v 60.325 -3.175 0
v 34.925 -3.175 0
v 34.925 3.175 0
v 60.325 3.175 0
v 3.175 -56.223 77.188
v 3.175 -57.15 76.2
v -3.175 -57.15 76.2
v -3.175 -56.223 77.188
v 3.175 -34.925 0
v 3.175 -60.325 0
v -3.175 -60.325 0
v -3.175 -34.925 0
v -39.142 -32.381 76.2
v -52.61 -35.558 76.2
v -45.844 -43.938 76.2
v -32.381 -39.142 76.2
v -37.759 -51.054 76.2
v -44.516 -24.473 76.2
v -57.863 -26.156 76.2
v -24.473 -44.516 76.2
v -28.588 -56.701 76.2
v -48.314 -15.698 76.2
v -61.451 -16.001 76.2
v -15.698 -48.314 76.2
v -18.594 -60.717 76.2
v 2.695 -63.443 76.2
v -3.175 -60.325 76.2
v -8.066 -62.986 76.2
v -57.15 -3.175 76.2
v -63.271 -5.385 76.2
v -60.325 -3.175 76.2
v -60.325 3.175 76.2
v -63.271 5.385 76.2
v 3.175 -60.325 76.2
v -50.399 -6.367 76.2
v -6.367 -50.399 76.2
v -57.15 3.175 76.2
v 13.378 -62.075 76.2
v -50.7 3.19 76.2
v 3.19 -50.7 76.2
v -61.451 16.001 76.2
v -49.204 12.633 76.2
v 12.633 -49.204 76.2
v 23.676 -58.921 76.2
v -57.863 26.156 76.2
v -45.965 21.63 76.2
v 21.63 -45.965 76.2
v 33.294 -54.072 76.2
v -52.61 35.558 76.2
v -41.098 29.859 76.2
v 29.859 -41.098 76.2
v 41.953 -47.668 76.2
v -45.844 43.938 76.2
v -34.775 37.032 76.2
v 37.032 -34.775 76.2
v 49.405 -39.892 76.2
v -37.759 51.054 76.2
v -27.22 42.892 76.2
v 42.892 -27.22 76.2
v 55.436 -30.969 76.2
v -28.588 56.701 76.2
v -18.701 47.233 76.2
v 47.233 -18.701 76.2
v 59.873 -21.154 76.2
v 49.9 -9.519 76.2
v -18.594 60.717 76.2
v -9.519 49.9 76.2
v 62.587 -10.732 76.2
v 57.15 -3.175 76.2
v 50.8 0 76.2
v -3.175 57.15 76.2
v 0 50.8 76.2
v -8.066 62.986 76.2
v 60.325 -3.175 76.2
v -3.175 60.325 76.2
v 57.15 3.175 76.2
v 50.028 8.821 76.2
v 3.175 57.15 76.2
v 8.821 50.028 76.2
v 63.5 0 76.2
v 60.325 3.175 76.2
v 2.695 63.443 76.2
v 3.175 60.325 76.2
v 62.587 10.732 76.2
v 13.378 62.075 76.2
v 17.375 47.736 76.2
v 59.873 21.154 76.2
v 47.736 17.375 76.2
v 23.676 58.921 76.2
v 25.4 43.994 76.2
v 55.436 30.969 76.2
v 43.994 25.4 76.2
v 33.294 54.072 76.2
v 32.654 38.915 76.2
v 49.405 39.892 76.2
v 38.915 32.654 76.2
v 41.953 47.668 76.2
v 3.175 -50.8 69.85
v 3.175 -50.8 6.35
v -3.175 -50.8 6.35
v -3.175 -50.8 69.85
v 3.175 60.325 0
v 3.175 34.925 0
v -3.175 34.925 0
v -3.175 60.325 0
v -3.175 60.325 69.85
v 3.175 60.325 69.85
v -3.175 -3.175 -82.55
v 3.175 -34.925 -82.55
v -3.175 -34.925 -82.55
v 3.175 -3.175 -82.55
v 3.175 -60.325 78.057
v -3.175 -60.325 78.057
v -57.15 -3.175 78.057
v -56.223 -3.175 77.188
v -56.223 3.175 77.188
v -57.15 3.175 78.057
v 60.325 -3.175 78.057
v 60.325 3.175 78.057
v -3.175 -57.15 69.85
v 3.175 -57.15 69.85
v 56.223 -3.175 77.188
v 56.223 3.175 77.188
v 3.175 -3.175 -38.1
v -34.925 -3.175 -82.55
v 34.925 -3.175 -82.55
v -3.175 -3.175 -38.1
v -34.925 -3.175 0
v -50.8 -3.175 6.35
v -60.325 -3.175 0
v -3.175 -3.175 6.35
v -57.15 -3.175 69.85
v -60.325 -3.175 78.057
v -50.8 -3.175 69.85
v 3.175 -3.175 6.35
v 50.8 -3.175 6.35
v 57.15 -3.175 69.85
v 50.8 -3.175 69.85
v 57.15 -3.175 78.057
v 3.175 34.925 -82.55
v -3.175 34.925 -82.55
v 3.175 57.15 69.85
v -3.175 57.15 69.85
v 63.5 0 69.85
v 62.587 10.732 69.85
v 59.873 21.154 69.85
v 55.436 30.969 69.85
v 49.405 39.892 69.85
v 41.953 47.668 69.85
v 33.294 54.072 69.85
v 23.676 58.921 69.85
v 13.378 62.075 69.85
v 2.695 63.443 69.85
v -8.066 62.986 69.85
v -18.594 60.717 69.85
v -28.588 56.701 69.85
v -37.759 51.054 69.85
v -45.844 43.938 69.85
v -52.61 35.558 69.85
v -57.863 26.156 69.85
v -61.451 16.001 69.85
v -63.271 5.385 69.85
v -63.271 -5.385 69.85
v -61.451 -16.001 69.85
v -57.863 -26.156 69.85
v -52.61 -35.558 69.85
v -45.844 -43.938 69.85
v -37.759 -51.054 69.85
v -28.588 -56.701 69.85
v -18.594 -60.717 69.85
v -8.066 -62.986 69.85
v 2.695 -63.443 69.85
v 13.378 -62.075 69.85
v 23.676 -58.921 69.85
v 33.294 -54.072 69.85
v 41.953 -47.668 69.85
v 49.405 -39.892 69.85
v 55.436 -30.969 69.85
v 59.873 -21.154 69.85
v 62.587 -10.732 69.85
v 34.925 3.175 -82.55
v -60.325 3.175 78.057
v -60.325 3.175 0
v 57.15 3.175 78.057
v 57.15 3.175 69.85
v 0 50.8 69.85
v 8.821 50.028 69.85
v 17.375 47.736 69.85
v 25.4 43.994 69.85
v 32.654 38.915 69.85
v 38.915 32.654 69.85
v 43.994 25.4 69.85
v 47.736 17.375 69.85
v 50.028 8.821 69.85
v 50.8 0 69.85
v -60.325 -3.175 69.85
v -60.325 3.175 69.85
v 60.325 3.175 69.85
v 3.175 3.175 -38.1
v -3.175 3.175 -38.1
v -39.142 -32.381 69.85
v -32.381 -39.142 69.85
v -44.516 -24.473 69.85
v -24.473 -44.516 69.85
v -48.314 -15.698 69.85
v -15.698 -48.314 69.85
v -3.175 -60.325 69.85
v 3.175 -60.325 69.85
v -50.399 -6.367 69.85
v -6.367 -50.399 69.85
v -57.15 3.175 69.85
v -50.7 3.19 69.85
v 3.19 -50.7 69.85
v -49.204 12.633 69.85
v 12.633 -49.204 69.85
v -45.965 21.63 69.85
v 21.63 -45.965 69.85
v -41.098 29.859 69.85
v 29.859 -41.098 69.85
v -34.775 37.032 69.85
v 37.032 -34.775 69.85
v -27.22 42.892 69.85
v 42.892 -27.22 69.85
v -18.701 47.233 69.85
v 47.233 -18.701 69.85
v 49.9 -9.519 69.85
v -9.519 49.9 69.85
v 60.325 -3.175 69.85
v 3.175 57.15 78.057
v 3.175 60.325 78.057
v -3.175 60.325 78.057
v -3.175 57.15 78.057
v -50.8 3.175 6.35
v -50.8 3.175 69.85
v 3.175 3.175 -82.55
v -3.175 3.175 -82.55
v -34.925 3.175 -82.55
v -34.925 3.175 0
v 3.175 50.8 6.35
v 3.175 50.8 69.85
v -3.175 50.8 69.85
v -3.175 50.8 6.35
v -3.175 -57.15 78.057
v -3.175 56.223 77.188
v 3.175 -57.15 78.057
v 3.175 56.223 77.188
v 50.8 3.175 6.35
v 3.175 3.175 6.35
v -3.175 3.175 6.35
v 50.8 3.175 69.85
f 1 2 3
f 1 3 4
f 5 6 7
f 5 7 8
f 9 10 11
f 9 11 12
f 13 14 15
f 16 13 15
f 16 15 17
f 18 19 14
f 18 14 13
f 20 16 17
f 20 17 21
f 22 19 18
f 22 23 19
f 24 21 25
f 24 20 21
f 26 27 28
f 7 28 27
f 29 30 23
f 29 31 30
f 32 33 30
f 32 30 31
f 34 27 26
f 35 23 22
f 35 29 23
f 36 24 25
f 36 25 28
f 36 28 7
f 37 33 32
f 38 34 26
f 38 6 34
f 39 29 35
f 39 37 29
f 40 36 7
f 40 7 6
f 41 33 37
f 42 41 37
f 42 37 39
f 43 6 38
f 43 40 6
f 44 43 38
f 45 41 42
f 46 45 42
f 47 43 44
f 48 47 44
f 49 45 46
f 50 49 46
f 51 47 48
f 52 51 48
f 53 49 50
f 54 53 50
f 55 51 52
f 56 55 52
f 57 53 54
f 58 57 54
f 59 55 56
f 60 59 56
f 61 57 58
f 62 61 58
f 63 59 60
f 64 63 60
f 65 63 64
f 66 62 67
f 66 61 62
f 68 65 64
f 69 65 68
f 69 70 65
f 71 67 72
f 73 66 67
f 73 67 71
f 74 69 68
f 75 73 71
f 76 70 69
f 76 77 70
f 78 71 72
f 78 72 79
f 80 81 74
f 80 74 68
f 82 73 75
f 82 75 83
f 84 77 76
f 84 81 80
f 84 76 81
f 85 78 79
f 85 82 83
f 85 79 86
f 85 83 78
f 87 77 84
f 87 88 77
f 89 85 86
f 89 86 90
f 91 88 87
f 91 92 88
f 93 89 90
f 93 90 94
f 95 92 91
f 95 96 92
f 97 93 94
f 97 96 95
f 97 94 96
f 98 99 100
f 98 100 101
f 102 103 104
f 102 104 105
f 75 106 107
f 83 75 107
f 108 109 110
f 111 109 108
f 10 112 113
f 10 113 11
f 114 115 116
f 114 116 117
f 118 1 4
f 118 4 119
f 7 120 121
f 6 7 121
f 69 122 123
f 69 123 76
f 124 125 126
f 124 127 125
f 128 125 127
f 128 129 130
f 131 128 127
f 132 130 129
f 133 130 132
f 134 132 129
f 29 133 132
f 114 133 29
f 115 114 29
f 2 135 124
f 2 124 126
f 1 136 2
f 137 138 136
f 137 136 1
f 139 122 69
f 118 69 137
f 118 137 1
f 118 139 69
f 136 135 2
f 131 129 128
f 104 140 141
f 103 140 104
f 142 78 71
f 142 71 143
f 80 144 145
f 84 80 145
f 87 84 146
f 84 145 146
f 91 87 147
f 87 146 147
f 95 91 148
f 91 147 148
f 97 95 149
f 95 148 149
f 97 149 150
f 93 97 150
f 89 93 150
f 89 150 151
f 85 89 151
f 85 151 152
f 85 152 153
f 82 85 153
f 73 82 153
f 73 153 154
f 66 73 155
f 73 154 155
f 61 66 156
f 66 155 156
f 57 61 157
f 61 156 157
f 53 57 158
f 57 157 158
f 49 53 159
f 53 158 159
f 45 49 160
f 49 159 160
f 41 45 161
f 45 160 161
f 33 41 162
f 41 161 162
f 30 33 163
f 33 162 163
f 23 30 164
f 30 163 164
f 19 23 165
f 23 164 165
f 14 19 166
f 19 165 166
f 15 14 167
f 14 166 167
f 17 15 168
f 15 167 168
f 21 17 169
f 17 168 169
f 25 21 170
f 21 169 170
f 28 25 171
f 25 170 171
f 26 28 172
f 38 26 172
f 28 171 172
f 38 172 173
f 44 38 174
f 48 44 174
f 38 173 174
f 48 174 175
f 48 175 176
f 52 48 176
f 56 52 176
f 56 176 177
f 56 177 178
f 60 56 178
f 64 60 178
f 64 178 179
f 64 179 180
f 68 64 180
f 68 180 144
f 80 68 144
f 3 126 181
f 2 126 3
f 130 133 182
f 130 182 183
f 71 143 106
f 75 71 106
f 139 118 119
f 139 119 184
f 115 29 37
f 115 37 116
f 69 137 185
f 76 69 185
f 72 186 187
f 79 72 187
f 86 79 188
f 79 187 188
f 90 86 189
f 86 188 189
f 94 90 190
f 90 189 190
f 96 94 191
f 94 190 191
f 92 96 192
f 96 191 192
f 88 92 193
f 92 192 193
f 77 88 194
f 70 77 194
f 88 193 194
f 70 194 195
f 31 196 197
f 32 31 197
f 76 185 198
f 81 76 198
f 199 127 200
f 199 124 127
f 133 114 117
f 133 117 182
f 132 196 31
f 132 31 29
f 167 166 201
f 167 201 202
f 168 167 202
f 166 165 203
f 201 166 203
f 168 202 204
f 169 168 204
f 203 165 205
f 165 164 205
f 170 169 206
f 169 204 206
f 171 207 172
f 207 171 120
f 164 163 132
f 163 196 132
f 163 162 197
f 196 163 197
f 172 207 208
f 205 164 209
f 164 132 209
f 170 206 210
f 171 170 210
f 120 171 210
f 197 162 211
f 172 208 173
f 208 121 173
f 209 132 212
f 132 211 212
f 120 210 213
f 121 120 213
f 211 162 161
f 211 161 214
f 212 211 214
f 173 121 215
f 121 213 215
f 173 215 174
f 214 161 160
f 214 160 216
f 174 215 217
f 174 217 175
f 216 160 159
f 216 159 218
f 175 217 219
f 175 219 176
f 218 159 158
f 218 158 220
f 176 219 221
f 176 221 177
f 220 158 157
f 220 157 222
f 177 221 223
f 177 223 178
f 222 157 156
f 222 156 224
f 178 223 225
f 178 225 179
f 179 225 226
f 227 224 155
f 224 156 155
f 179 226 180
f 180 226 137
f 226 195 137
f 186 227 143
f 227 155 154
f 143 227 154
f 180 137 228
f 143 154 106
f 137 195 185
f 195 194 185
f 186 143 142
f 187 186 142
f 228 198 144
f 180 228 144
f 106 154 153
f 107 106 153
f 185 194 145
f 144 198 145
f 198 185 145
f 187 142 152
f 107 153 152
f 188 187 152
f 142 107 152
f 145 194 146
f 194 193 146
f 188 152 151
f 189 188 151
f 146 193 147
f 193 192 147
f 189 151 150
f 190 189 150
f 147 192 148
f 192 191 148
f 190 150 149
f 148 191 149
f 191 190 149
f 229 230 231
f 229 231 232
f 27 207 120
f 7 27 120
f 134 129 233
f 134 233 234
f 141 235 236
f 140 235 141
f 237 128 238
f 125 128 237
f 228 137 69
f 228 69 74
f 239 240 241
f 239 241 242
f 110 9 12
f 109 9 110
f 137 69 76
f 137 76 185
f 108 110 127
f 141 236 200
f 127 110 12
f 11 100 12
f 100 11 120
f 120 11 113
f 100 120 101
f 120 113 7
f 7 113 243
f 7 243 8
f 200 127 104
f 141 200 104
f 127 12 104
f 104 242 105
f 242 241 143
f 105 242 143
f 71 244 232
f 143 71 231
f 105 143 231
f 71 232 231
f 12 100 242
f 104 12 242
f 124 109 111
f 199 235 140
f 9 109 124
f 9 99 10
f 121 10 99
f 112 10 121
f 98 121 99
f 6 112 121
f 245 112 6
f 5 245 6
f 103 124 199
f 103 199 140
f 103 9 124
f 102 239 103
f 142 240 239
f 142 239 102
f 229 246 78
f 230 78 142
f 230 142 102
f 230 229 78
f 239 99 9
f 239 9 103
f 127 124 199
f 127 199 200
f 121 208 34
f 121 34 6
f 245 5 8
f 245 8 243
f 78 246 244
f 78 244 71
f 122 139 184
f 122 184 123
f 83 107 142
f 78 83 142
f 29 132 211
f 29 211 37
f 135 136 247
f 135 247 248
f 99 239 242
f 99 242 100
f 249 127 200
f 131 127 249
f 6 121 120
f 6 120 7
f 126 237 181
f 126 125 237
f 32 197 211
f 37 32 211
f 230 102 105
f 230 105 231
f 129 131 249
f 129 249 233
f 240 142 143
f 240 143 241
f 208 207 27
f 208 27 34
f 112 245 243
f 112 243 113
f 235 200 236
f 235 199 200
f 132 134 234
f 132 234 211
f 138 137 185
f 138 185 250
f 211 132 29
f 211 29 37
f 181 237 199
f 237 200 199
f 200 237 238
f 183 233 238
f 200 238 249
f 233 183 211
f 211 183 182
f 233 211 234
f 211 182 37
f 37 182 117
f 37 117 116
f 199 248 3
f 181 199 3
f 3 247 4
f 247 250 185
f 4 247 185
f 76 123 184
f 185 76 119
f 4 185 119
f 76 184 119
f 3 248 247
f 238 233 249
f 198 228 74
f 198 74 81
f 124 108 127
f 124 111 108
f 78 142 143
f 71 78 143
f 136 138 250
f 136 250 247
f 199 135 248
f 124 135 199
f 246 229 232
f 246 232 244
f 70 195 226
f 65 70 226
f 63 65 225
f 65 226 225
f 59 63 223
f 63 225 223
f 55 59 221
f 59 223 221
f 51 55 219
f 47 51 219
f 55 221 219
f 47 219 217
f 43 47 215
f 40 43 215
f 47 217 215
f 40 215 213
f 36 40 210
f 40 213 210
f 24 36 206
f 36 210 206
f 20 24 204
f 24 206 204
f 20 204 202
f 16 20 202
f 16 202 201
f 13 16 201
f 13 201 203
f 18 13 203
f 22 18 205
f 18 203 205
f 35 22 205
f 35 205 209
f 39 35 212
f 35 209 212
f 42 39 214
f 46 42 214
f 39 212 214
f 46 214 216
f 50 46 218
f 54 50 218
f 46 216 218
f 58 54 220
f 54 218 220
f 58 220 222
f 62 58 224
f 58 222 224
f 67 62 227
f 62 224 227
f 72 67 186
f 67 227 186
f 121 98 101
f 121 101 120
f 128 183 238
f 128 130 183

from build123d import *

# Parameters (mm, degrees)
F1_DEPTH = 3.175
F3_DEPTH = 3.175
F4_R     = 63.5
F4_W     = 6.35
F4_H     = 3.175
F4_W_2   = 3.175
F4_H_2   = 6.35
F5_DEPTH = 6.35


# Not quite as in the source:
# - a feature names something its author has since deleted; it is built from what else it names


with BuildPart() as f1:
    # F0 (on Front) → F1 (new body, symmetric)
    with BuildSketch(Plane.XZ):
        Polygon((-34.925, -82.55), (0, -82.55), (34.925, -82.55), (34.925, 0), (60.325, 0), (60.325, 69.85), (57.15, 69.85), (50.8, 69.85), (50.8, 6.35), (3.175, 6.35), (3.175, -38.1), (-3.175, -38.1), (-3.175, 6.35), (-50.8, 6.35), (-50.8, 69.85), (-57.15, 69.85), (-60.325, 69.85), (-60.325, 0), (-34.925, 0), align=None)
        Polygon((-60.325, 78.0568867745), (-60.325, 69.85), (-57.15, 69.85), (-57.15, 76.2), (-56.2234869578, 77.1882823867), (-57.15, 78.0568867745), align=None)
        Polygon((57.15, 69.85), (60.325, 69.85), (60.325, 78.0568867745), (57.15, 78.0568867745), (56.2234869578, 77.1882823867), (57.15, 76.2), align=None)
    extrude(amount=F1_DEPTH, both=True)


with BuildPart() as f3:
    # F2 (on Right) → F3 (new body, symmetric)
    with BuildSketch(Plane.YZ):
        Polygon((3.175, -38.1), (3.175, -82.55), (34.925, -82.55), (34.925, 0), (60.325, 0), (60.325, 69.85), (57.15, 69.85), (50.8, 69.85), (50.8, 6.35), (3.175, 6.35), (-3.175, 6.35), (-50.8, 6.35), (-50.8, 69.85), (-57.15, 69.85), (-60.325, 69.85), (-60.325, 0), (-34.925, 0), (-34.925, -82.55), (-3.175, -82.55), (-3.175, -38.1), (0, -38.1), align=None)
        Polygon((57.15, 69.85), (60.325, 69.85), (60.325, 78.0568867745), (57.15, 78.0568867745), (56.2234869578, 77.1882823867), (57.15, 76.2), align=None)
        Polygon((-60.325, 78.0568867745), (-60.325, 69.85), (-57.15, 69.85), (-57.15, 76.2), (-56.2234869578, 77.1882823867), (-57.15, 78.0568867745), align=None)
    extrude(amount=F3_DEPTH, both=True)


with BuildPart() as f5:
    # F4 (on face) → F5 (new body)
    with BuildSketch(Plane.XY.offset(69.85)):
        Circle(F4_R)
        with Locations((0, -58.7375)):
            Rectangle(F4_W, F4_H, mode=Mode.SUBTRACT)
        with Locations((-58.7375, 0)):
            Rectangle(F4_W_2, F4_H_2, mode=Mode.SUBTRACT)
        with BuildLine():
            ThreePointArc((-6.22e-08, 50.8), (35.9210244623, 35.9210245063), (50.8, 0))
            ThreePointArc((50.8, 0), (-35.9210244623, -35.9210245063), (-6.22e-08, 50.8))
        make_face(mode=Mode.SUBTRACT)
        with Locations((58.7375, 0)):
            Rectangle(F4_W_2, F4_H_2, mode=Mode.SUBTRACT)
        Polygon((3.175, 50.8), (-6.22e-08, 50.8), (-3.175, 50.8), (-3.175, 57.15), (-3.175, 60.325), (3.175, 60.325), (3.175, 57.15), align=None, mode=Mode.SUBTRACT)
        Polygon((-3.175, 50.8), (-6.22e-08, 50.8), (3.175, 50.8), (3.175, 57.15), (-3.175, 57.15), align=None)
    extrude(amount=F5_DEPTH)


solid = Compound([f1.part, f3.part, f5.part])
